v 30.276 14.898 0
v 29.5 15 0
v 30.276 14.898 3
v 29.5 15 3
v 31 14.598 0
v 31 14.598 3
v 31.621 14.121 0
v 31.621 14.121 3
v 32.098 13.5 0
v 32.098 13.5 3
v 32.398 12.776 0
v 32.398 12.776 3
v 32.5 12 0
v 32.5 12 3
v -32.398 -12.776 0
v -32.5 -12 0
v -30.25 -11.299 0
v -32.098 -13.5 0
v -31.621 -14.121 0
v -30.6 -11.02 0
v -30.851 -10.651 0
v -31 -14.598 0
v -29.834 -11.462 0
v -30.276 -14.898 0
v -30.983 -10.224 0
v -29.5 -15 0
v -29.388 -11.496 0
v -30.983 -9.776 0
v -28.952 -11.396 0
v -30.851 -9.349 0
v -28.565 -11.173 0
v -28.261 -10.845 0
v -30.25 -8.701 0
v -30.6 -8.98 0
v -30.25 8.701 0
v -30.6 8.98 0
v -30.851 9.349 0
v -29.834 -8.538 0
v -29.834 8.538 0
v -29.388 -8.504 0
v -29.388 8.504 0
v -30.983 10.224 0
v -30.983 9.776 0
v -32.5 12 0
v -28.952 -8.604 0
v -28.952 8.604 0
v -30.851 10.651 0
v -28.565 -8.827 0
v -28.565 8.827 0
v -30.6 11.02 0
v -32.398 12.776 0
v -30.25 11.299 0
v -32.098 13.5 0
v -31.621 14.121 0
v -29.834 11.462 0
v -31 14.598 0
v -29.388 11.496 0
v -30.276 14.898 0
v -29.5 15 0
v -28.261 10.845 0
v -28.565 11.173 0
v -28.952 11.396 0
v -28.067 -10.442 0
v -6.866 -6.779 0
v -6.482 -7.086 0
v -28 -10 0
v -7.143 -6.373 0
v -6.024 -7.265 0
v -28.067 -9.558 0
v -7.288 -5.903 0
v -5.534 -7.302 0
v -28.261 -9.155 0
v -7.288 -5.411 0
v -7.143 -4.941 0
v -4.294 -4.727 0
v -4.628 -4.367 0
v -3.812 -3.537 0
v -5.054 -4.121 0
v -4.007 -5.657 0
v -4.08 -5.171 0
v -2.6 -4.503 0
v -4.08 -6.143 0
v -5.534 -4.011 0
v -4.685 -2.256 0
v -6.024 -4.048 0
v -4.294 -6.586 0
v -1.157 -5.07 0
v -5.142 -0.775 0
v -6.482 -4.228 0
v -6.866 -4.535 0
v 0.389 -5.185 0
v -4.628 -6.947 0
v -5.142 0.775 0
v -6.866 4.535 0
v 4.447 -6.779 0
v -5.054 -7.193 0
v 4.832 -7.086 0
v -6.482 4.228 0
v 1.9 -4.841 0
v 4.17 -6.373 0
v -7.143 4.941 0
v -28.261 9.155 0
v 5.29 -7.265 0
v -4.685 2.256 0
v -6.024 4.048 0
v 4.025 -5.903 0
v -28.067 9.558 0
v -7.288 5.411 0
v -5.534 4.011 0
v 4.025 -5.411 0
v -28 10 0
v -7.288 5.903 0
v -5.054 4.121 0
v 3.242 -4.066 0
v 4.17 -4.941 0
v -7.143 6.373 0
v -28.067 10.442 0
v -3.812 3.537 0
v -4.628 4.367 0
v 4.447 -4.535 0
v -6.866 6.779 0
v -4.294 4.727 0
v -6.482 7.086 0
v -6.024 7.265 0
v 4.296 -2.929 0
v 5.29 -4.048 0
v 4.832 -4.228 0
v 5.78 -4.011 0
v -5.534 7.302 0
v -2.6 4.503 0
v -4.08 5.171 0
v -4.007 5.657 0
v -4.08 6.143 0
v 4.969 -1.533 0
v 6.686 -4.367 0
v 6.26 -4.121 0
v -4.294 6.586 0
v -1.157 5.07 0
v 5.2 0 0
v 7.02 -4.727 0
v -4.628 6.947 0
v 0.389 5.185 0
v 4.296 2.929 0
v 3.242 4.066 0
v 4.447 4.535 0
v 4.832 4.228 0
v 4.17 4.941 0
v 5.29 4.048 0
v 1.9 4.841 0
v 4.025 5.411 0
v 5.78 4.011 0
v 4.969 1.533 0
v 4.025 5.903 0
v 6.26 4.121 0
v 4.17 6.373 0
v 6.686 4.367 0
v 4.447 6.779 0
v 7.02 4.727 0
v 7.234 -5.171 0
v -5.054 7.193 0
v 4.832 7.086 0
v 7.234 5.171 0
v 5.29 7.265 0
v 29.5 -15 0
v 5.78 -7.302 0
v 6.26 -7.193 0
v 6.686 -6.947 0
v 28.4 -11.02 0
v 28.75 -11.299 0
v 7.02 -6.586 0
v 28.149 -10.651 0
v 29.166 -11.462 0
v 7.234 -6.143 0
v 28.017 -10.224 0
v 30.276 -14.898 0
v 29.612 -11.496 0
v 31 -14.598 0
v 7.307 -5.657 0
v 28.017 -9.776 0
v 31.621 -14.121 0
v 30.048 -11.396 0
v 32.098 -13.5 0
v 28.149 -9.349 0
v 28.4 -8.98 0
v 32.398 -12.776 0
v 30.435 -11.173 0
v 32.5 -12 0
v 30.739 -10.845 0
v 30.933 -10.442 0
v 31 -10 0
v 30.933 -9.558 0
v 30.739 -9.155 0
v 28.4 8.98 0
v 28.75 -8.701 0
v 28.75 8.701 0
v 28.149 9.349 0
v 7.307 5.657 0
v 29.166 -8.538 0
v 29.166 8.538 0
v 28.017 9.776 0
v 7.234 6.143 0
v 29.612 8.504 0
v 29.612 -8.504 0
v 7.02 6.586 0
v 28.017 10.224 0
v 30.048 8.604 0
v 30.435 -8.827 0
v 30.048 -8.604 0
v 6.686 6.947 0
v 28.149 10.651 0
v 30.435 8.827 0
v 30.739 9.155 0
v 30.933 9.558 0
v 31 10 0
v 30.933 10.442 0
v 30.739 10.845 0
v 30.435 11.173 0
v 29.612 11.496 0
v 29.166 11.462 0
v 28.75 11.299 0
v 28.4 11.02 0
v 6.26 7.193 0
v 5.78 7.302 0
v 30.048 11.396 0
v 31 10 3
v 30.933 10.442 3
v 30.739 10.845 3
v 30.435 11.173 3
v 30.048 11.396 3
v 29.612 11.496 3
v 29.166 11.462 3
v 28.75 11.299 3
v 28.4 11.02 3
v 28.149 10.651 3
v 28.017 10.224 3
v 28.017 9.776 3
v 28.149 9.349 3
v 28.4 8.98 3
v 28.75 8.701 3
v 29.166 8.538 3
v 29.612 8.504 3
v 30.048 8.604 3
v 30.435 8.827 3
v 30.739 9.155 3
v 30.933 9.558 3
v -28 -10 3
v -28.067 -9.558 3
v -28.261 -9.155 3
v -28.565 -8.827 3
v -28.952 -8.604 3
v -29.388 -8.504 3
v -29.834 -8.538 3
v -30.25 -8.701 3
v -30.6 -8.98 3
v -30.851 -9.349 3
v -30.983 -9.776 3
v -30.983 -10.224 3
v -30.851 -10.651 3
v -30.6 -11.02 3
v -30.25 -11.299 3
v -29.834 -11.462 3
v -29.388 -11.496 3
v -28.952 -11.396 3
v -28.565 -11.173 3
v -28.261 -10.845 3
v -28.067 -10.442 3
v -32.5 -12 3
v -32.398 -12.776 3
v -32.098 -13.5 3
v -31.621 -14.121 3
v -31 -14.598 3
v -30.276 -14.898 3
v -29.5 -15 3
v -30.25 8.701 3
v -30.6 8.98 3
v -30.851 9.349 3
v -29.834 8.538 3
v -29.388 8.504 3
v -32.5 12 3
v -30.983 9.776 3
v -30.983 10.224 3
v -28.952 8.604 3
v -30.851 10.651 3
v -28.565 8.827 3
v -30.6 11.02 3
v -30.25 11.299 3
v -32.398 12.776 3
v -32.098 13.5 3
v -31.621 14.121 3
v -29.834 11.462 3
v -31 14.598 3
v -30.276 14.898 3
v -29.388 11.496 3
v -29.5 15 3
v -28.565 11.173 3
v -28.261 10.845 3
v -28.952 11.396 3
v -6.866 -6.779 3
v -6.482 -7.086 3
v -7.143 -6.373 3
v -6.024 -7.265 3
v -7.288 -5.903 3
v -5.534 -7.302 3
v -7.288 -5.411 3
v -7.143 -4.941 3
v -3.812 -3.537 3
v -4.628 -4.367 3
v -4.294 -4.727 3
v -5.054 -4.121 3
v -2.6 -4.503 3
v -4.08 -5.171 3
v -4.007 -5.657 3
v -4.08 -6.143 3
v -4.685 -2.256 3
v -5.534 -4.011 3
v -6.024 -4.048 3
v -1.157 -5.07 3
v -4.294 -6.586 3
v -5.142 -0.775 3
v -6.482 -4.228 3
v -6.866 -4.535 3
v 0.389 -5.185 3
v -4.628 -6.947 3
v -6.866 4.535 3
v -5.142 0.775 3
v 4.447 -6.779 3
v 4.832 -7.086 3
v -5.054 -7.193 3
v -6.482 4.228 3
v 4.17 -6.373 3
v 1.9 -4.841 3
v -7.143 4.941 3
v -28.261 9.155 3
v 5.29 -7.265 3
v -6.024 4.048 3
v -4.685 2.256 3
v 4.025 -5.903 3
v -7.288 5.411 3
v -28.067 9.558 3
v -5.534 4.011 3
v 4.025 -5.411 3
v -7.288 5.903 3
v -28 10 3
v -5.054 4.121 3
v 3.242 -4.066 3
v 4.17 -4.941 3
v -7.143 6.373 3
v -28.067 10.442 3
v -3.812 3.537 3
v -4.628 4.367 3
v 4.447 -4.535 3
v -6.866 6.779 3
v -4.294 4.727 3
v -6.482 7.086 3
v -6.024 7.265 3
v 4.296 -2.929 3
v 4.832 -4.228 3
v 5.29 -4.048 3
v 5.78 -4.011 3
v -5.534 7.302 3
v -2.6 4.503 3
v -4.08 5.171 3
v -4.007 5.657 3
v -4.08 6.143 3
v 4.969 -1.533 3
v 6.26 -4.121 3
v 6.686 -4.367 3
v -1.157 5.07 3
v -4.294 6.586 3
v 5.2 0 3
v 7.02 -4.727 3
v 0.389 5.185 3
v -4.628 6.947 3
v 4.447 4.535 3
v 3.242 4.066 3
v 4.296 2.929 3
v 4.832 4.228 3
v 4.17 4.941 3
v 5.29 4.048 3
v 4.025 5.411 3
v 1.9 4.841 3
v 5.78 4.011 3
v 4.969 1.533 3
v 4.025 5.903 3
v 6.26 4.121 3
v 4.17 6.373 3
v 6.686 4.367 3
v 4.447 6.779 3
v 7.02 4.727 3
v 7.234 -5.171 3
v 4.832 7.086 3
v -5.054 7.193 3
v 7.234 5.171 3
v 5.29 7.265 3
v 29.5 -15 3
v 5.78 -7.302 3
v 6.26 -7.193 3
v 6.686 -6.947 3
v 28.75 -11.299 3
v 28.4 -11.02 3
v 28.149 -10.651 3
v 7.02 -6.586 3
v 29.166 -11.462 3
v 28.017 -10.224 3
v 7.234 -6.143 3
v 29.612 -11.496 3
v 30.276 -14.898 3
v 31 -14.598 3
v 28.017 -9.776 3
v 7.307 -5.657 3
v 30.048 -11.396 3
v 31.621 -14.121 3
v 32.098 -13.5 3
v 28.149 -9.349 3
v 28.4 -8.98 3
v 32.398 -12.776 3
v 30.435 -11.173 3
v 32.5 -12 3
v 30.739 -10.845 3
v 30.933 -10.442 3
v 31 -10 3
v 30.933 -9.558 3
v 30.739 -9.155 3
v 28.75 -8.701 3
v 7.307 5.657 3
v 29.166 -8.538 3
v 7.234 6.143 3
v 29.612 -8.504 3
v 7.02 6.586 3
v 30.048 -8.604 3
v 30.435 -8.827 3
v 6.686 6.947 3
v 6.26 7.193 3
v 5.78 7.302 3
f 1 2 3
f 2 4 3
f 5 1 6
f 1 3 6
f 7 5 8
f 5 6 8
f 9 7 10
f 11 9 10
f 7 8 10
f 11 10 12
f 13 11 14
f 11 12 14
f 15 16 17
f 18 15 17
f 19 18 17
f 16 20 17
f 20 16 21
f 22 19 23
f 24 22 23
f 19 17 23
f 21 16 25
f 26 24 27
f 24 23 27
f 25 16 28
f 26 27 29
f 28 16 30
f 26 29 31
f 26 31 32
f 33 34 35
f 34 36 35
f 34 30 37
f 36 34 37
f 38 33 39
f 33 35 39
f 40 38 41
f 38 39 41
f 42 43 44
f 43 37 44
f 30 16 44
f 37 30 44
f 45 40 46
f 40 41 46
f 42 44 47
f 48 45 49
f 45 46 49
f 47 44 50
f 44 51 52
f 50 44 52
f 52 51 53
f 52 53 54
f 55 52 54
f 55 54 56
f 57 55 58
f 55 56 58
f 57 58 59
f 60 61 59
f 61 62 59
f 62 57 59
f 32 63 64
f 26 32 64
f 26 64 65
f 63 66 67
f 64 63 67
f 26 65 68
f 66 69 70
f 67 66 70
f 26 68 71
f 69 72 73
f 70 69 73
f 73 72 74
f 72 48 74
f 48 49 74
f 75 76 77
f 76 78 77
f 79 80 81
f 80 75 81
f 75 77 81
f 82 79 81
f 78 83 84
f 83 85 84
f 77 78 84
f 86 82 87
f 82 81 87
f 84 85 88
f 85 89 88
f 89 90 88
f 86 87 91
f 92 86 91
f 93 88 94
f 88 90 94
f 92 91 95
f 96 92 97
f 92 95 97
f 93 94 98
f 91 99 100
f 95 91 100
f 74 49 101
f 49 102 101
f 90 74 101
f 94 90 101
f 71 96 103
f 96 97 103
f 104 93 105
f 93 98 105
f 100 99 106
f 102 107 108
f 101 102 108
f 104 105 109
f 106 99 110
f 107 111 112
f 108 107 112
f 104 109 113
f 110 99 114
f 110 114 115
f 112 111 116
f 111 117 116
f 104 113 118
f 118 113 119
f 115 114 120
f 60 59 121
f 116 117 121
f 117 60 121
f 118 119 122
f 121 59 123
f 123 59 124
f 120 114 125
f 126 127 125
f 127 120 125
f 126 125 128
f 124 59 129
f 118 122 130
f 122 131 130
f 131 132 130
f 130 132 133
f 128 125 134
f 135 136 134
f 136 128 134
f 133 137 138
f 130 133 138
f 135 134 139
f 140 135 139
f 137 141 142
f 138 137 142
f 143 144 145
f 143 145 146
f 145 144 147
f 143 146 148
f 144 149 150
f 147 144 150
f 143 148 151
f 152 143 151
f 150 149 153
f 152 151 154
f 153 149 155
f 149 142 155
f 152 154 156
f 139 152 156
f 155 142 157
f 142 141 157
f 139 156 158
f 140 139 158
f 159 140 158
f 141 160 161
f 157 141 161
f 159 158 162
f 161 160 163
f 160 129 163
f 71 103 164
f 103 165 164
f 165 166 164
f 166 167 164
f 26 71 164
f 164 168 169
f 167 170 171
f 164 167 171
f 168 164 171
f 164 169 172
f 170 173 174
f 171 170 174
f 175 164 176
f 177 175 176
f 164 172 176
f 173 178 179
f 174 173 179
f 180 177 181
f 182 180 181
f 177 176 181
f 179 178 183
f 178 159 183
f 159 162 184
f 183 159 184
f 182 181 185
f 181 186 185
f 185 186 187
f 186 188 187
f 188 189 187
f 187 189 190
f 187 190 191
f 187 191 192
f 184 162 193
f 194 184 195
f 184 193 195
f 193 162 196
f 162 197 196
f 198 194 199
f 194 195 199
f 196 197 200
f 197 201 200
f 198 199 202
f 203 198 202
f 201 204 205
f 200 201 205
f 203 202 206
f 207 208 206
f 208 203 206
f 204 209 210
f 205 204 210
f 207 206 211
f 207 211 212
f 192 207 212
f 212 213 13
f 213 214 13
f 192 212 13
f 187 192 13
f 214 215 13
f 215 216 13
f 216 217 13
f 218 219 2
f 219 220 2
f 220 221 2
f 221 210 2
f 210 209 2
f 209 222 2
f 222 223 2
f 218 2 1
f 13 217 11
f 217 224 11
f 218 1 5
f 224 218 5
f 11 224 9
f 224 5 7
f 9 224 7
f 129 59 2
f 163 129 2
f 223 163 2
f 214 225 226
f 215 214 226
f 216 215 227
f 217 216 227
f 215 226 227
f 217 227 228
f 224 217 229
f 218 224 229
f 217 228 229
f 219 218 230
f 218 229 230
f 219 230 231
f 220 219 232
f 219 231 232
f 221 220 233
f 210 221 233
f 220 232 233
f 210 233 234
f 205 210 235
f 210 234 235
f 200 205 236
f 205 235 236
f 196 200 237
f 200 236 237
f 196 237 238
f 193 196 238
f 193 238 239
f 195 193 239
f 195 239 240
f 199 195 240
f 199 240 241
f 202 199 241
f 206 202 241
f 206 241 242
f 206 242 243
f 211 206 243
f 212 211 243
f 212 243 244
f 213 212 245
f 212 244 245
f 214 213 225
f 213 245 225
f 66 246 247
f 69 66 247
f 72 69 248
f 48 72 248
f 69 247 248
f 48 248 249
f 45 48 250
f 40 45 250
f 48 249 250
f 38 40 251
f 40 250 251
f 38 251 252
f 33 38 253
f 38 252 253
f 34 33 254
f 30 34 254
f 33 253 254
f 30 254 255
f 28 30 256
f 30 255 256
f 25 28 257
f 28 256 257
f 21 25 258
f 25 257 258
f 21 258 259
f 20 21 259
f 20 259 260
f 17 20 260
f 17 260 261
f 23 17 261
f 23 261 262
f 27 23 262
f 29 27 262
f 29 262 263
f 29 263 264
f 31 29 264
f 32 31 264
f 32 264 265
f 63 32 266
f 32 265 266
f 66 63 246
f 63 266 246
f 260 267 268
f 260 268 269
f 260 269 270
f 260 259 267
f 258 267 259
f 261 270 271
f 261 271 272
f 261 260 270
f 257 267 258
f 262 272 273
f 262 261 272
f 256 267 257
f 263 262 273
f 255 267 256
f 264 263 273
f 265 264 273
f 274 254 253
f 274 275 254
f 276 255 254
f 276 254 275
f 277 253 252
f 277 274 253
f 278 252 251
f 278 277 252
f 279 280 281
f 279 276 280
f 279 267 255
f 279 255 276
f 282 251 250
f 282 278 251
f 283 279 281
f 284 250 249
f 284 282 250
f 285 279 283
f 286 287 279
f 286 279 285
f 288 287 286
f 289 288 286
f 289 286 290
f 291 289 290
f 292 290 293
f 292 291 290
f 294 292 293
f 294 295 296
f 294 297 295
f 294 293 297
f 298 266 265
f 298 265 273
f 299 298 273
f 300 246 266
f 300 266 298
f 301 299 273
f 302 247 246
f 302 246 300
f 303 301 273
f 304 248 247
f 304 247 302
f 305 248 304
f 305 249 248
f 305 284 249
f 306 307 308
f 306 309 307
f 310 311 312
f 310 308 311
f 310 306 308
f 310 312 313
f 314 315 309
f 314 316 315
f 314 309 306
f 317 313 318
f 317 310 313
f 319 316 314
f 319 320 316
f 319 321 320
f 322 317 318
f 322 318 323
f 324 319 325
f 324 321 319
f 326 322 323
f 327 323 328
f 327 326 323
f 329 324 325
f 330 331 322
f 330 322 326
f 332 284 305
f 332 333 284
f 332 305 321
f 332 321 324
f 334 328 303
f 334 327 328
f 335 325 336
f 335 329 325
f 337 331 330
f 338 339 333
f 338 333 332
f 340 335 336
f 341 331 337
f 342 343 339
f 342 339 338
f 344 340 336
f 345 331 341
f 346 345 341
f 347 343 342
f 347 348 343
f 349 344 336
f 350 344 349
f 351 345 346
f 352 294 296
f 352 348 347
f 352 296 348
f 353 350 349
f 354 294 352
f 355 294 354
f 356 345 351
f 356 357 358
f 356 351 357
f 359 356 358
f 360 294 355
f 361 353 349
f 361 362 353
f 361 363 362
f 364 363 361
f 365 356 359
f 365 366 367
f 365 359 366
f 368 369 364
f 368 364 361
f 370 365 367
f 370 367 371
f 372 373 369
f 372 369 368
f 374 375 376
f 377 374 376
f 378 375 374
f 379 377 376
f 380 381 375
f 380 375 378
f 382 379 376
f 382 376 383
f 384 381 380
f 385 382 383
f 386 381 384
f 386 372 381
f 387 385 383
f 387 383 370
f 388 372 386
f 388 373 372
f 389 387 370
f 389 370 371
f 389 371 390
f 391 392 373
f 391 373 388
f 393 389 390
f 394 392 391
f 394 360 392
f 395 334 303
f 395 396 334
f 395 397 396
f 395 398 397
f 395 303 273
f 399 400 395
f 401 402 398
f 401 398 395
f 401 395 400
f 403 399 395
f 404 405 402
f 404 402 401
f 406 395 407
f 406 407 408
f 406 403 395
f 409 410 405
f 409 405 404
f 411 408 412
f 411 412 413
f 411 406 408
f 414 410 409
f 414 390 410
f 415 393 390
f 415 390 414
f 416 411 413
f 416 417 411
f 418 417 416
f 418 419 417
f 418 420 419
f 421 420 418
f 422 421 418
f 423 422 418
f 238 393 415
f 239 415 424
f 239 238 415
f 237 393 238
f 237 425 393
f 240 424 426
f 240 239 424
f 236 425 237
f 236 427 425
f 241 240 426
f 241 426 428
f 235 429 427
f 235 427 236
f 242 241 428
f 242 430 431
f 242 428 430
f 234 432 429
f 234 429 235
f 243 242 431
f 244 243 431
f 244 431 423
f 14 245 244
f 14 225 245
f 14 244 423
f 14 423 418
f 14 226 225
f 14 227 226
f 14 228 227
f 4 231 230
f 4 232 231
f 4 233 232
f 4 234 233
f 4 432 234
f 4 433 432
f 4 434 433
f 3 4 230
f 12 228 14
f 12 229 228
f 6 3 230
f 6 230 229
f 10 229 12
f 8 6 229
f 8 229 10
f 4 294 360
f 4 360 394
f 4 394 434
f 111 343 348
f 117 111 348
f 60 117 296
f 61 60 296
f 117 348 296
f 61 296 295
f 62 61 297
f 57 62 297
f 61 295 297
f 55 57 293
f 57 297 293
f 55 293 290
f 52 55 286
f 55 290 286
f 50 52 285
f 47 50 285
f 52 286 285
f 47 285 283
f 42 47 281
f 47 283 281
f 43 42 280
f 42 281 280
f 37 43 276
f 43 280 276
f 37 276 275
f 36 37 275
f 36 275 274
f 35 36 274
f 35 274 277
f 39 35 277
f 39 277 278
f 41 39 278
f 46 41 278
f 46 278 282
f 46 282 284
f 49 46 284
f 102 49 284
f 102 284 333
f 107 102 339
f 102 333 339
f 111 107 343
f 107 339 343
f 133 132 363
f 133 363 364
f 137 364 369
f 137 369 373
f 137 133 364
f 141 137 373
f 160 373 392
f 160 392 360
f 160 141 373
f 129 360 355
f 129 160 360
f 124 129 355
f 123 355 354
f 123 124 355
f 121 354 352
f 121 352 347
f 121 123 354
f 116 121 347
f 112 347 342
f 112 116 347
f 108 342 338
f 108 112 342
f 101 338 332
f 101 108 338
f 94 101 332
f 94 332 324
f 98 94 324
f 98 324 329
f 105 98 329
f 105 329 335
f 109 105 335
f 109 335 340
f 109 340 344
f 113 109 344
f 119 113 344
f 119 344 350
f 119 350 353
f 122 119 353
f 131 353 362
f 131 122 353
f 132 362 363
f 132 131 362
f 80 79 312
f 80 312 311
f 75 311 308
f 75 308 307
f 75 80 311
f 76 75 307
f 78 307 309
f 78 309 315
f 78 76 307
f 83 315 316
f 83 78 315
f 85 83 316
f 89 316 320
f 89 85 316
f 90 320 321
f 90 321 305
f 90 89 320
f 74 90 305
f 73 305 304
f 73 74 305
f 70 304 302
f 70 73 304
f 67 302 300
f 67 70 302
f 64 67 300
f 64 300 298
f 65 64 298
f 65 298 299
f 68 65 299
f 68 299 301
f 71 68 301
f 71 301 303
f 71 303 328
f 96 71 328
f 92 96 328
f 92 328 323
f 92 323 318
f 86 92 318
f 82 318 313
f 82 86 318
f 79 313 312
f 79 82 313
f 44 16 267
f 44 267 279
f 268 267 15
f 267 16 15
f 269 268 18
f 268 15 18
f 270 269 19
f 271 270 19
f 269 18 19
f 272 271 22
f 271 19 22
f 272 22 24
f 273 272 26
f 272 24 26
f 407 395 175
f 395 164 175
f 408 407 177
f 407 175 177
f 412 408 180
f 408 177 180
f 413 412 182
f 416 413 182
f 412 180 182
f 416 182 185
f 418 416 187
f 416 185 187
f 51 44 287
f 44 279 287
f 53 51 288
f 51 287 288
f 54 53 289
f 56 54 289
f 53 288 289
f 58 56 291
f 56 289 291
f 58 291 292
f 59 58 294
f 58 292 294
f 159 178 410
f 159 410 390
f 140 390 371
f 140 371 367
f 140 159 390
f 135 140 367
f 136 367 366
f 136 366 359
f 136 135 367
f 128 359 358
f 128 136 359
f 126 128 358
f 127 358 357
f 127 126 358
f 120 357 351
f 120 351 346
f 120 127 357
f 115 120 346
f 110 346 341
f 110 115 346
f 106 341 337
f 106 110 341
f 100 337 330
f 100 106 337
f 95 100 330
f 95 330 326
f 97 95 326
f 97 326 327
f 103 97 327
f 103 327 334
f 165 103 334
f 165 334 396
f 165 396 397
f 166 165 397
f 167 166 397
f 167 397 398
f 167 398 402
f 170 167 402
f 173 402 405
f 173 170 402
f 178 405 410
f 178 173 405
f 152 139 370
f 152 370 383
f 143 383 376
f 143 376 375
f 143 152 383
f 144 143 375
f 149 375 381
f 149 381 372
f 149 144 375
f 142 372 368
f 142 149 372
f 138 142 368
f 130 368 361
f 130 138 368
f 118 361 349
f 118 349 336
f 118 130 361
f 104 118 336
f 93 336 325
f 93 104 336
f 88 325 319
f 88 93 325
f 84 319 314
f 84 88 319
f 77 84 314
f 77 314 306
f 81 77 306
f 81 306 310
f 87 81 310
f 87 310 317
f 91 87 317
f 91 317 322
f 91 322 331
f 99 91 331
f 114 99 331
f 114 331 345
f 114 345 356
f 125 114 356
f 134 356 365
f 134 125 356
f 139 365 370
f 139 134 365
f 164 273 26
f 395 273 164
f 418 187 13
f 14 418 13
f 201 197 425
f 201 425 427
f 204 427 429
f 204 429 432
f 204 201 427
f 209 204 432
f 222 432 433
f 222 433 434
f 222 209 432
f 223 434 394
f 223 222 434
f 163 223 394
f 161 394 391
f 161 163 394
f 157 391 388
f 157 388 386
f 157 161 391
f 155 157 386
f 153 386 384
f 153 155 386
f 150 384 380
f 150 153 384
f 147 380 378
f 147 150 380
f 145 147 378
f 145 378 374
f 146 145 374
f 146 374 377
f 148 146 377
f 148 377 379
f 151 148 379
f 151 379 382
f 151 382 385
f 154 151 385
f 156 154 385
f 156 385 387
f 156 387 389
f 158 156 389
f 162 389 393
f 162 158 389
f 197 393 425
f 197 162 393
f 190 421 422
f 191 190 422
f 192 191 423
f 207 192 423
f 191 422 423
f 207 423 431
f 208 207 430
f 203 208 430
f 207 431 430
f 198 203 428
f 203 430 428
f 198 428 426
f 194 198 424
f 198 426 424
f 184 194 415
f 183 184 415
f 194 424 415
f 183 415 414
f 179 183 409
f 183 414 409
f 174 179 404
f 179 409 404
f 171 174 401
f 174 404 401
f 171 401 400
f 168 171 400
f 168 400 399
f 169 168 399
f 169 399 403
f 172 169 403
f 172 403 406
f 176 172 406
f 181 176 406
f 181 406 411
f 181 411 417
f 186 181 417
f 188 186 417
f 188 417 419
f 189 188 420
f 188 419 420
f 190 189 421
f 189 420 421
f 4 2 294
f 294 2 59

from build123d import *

# Parameters (mm, degrees)
SKETCH_1_W          = 65
SKETCH_1_H          = 40
SKETCH_1_R          = 1.65
SKETCH_1_R_2        = 5.2
EXTRUDE_1_DEPTH     = 3
SKETCH_2_R          = 1.5
CUT_EXTRUDE_1_DEPTH = 3
SKETCH_3_W          = 65
SKETCH_3_H          = 5
CUT_EXTRUDE_2_DEPTH = 10
SKETCH_4_W          = 65
SKETCH_4_H          = 5
CUT_EXTRUDE_3_DEPTH = 10
FILLET_2_R          = 3


with BuildPart() as part:
    # 草图1 → 凸台-拉伸1 (new body)
    with BuildSketch(Plane.XY):
        Rectangle(SKETCH_1_W, SKETCH_1_H)
        with Locations((-5.656854249, 5.656854249)):
            Circle(SKETCH_1_R, mode=Mode.SUBTRACT)
        Circle(SKETCH_1_R_2, mode=Mode.SUBTRACT)
        with Locations((5.656854249, 5.656854249)):
            Circle(SKETCH_1_R, mode=Mode.SUBTRACT)
        with Locations((5.656854249, -5.656854249)):
            Circle(SKETCH_1_R, mode=Mode.SUBTRACT)
        with Locations((-5.656854249, -5.656854249)):
            Circle(SKETCH_1_R, mode=Mode.SUBTRACT)
    extrude(amount=EXTRUDE_1_DEPTH)

    # 草图2 → 切除-拉伸1 (cut)
    with BuildSketch(Plane.XY.offset(3)):
        with Locations((29.5, 10)):
            Circle(SKETCH_2_R)
        with Locations((29.5, -10)):
            Circle(SKETCH_2_R)
        with Locations((-29.5, -10)):
            Circle(SKETCH_2_R)
        with Locations((-29.5, 10)):
            Circle(SKETCH_2_R)
    extrude(amount=-CUT_EXTRUDE_1_DEPTH, mode=Mode.SUBTRACT)

    # 草图3 → 切除-拉伸2 (cut)
    with BuildSketch(Plane(origin=(0, 0, 0), x_dir=(-1, 0, 0), z_dir=(0, 0, -1))):
        with Locations((0, 17.5)):
            Rectangle(SKETCH_3_W, SKETCH_3_H)
    extrude(amount=-CUT_EXTRUDE_2_DEPTH, mode=Mode.SUBTRACT)

    # 草图4 → 切除-拉伸3 (cut)
    with BuildSketch(Plane.XY.offset(3)):
        with Locations((0, -17.5)):
            Rectangle(SKETCH_4_W, SKETCH_4_H)
    extrude(amount=-CUT_EXTRUDE_3_DEPTH, mode=Mode.SUBTRACT)

    # 圆角2
    fillet_2_edges = [part.edges().sort_by_distance(p)[0] for p in [
        (-32.5, 15, 1.5),
        (32.5, 15, 1.5),
        (-32.5, -15, 1.5),
        (32.5, -15, 1.5),
    ]]
    fillet(fillet_2_edges, radius=FILLET_2_R)


solid = part.part
